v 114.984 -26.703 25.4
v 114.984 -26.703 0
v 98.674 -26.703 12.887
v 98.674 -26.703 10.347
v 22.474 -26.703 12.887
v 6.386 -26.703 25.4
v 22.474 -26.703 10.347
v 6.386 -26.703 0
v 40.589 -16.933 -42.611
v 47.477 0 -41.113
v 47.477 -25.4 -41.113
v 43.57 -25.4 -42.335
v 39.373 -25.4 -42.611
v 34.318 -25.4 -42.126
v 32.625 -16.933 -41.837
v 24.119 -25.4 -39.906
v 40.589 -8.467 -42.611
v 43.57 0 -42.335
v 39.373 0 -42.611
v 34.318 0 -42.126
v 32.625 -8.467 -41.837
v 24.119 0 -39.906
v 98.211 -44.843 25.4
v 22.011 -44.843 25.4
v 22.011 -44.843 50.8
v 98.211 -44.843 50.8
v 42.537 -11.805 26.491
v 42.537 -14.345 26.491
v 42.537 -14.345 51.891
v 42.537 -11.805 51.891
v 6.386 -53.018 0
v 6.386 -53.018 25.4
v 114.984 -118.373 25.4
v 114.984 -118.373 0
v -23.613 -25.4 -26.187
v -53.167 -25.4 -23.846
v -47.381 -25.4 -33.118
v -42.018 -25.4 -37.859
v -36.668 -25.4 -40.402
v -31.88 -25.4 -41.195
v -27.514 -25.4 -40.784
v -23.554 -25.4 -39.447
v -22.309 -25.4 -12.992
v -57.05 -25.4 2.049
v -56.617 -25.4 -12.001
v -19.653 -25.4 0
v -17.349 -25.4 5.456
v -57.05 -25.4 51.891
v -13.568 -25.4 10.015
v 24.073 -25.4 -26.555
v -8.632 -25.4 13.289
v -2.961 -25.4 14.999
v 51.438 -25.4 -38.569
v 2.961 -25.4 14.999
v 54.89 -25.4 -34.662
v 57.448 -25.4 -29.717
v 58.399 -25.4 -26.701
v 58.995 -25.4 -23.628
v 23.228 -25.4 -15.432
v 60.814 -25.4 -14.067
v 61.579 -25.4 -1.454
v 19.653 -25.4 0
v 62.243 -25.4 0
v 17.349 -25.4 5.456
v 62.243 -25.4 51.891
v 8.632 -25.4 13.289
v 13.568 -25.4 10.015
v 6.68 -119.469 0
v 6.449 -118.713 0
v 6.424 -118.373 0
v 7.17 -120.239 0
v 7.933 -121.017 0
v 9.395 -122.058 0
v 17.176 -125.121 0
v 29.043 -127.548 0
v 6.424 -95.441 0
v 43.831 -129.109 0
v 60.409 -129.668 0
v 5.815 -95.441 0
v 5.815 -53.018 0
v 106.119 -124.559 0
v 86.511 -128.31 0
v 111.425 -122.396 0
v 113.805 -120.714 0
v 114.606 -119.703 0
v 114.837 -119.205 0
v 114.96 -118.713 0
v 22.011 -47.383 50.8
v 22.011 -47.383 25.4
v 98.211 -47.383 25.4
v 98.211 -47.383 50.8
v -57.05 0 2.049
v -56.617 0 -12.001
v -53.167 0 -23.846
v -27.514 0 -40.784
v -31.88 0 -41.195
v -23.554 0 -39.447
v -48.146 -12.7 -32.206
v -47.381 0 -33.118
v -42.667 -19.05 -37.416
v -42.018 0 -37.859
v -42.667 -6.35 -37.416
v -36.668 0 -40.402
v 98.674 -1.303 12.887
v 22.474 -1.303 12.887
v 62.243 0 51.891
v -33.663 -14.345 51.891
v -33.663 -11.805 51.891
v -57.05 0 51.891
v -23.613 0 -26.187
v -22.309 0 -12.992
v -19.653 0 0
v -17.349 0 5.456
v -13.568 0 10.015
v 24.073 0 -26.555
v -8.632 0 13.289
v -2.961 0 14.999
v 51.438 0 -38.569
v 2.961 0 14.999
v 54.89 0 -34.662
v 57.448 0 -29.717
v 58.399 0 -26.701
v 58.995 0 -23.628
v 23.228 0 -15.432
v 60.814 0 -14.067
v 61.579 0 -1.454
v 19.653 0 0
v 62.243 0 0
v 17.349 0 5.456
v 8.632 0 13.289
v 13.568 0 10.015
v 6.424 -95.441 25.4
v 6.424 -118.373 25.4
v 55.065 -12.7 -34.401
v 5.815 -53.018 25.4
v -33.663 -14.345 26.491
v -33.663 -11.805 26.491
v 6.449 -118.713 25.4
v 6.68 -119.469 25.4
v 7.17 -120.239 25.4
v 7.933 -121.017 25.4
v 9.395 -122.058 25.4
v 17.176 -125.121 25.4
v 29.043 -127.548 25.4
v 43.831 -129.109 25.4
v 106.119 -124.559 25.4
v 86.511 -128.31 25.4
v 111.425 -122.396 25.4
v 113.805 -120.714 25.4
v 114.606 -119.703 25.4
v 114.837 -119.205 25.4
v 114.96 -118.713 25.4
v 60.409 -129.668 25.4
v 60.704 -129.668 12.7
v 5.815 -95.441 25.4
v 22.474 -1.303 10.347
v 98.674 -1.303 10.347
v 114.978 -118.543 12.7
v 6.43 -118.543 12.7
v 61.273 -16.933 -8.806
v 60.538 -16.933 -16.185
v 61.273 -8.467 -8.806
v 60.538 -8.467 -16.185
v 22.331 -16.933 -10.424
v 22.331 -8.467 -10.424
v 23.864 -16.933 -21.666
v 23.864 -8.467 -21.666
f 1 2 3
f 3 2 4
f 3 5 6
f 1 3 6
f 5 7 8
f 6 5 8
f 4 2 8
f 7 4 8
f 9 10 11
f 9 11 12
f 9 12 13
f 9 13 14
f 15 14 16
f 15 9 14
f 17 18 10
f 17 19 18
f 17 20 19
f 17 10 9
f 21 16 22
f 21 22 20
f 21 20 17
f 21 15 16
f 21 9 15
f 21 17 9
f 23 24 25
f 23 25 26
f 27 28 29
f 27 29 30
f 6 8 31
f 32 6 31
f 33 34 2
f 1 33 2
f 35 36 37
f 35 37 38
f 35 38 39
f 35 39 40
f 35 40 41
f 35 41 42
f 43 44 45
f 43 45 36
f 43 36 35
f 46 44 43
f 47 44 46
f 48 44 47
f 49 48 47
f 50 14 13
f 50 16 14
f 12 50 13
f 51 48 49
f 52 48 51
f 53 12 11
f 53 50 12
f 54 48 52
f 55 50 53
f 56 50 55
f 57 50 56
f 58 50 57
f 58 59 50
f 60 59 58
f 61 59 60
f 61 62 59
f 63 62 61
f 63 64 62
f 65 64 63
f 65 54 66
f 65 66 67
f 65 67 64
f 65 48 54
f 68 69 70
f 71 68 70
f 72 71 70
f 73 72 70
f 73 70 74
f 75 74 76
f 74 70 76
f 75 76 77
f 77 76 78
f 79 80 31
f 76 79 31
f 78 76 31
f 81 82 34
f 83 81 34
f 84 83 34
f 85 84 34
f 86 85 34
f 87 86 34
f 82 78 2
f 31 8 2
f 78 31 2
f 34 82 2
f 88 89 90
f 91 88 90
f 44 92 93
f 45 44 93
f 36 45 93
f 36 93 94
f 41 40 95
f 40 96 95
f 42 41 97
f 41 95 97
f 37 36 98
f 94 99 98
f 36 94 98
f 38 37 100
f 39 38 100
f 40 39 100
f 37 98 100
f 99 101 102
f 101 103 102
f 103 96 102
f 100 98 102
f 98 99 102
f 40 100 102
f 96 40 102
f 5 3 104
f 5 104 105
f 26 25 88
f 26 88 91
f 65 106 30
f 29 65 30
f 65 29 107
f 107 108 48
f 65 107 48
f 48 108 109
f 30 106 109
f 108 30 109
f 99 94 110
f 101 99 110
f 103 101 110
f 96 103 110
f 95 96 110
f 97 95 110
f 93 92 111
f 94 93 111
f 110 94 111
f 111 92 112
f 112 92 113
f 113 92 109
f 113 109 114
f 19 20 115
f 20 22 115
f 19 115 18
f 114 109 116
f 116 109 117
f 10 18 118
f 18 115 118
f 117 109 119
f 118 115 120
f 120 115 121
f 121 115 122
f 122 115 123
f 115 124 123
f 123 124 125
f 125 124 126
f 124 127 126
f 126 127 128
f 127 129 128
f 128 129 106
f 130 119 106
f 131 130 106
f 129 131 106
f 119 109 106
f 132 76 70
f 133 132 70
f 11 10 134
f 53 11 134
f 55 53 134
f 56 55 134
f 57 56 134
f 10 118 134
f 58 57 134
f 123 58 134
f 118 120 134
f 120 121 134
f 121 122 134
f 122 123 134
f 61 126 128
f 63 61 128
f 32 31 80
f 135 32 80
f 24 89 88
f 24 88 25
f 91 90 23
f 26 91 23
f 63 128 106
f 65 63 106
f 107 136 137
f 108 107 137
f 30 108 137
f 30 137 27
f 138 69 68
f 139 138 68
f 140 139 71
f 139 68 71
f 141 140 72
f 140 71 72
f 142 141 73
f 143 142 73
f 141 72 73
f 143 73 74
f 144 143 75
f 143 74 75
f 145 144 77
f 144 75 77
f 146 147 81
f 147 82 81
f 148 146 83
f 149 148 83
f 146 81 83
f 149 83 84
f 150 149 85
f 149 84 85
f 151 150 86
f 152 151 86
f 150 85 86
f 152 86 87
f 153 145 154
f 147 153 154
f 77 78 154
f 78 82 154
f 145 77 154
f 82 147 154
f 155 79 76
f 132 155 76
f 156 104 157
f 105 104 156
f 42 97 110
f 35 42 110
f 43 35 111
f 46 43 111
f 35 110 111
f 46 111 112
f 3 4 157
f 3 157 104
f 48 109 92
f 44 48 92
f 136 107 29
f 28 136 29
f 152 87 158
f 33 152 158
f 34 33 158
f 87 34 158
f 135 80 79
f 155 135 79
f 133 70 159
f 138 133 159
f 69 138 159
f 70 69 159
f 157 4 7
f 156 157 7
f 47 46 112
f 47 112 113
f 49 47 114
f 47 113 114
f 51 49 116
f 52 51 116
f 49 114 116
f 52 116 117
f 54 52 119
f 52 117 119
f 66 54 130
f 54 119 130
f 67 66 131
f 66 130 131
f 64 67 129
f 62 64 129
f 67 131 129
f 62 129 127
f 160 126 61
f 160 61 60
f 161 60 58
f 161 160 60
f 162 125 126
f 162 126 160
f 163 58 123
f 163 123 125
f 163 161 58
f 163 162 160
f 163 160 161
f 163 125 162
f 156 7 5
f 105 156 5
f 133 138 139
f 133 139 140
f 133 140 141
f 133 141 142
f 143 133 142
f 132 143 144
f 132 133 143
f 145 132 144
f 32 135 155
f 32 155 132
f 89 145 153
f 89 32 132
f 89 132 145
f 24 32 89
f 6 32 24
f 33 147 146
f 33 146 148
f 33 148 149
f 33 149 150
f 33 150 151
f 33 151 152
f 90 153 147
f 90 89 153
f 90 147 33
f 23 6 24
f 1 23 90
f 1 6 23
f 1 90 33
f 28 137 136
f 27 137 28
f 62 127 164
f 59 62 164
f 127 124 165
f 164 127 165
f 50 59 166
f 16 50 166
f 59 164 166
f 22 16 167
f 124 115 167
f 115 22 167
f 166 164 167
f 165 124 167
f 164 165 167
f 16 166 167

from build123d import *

# Parameters (mm, degrees)
F1_DEPTH = 25.4
F2_W     = 76.2
F2_H     = 2.54
F3_DEPTH = 25.4
F5_DEPTH = 25.4
F6_W     = 76.2
F6_H     = 2.54
F7_DEPTH = 25.4
F8_W     = 76.2
F8_H     = 2.54
F9_DEPTH = 25.4


with BuildPart() as f1:
    # F0 (on Front) → F1 (new body)
    with BuildSketch(Plane.XZ):
        with BuildLine():
            Line((62.2428618371, 51.8912672997), (-57.0498779416, 51.8912672997))
            Line((-57.0498779416, 51.8912672997), (-57.0498779416, 2.0486290034))
            add(Edge.make_bspline(
                [(-57.0498779416, 2.0486290034), (-62.8725917554, -57.5601651506), (-23.5538572735, -39.4474879084)],
                knots=[1.4290915848, 1.4290915848, 1.4290915848, 3.4471381657, 3.4471381657, 3.4471381657], degree=2, weights=[1, 0.5326875763, 1]))
            ThreePointArc((-23.5538572735, -39.4474879084), (-23.1311062984, -19.5726887681), (-19.6531451654, 0))
            ThreePointArc((-19.6531451654, 0), (0, 15.2158019665), (19.6531451654, 0))
            add(Edge.make_bspline(
                [(19.6531451654, 0), (20.6238584336, -3.4875863708), (22.5912929652, -10.5562008448), (24.2387527598, -21.9019388925), (24.1620099315, -33.4497913044), (24.11910519, -39.9058684707)],
                knots=[0, 0, 0, 0, 0.3004169931, 0.608882958, 1, 1, 1, 1], degree=3))
            add(Edge.make_bspline(
                [(47.476719356, -41.1129942258), (41.3063324166, -44.1182628579), (32.717853118, -42.0442846037), (24.11910519, -39.9058684707)],
                knots=[0.6578997811, 0.6578997811, 0.6578997811, 0.6578997811, 1, 1, 1, 1], degree=3))
            add(Edge.make_bspline(
                [(58.9949473098, -23.6284681863), (56.9882398729, -30.879237475), (53.3148096325, -38.2695696963), (47.476719356, -41.1129942258)],
                knots=[0.3342228414, 0.3342228414, 0.3342228414, 0.3342228414, 0.6578997811, 0.6578997811, 0.6578997811, 0.6578997811], degree=3))
            add(Edge.make_bspline(
                [(61.5792318695, -1.454491908), (61.36202452, -8.8032522142), (61.0670364179, -16.1414574779), (58.9949473098, -23.6284681863)],
                knots=[0, 0, 0, 0, 0.3342228414, 0.3342228414, 0.3342228414, 0.3342228414], degree=3))
            Line((61.5792318695, -1.454491908), (62.2428618371, 0))
            Line((62.2428618371, 0), (62.2428618371, 51.8912672997))
        make_face()
        with BuildLine():
            add(Edge.make_bspline(
                [(47.476719356, -41.1129942258), (57.185089489, -36.7539276341), (58.9949473098, -23.6284681863)],
                knots=[0.3330351725, 0.3330351725, 0.3330351725, 1.3936926102, 1.3936926102, 1.3936926102], degree=2, weights=[1, 0.8626408456, 1]))
            add(Edge.make_bspline(
                [(58.9949473098, -23.6284681863), (56.9882398729, -30.879237475), (53.3148096325, -38.2695696963), (47.476719356, -41.1129942258)],
                knots=[0.3342228414, 0.3342228414, 0.3342228414, 0.3342228414, 0.6578997811, 0.6578997811, 0.6578997811, 0.6578997811], degree=3))
        make_face()
    extrude(amount=F1_DEPTH)

    # F2 (on face) → F3 (cut)
    with BuildSketch(Plane.XY.offset(51.8912672997)):
        with Locations((4.4371271506, -13.0748547494)):
            Rectangle(F2_W, F2_H)
    extrude(amount=-F3_DEPTH, mode=Mode.SUBTRACT)


with BuildPart() as f5:
    # F4 (on Top) → F5 (new body)
    with BuildSketch(Plane.XY):
        with BuildLine():
            Line((6.4240375055, -95.4406112065), (6.4240375055, -118.3726499874))
            add(Edge.make_bspline(
                [(6.4240375055, -118.3726499874), (6.4240375055, -118.5430909379), (6.4487490888, -118.7134542936)],
                knots=[3.1415926536, 3.1415926536, 3.1415926536, 3.1717686083, 3.1717686083, 3.1717686083], degree=2, weights=[1, 0.9998861786, 1]))
            add(Edge.make_bspline(
                [(6.4487490888, -118.7134542936), (8.0377690426, -129.6682672247), (60.7042431856, -129.6682672247), (113.3707173286, -129.6682672247), (114.9597372824, -118.7134542936)],
                knots=[3.1717686083, 3.1717686083, 3.1717686083, 4.7123889804, 4.7123889804, 6.2530093525, 6.2530093525, 6.2530093525], degree=2, weights=[1, 0.7176947036, 1, 0.7176947036, 1]))
            add(Edge.make_bspline(
                [(114.9597372824, -118.7134542936), (114.9844488657, -118.5430909379), (114.9844488657, -118.3726499874)],
                knots=[6.2530093525, 6.2530093525, 6.2530093525, 6.2831853072, 6.2831853072, 6.2831853072], degree=2, weights=[1, 0.9998861786, 1]))
            Line((114.9844488657, -118.3726499874), (114.9844488657, -95.4406112065))
            Line((114.9844488657, -95.4406112065), (114.9844488657, -53.0177001276))
            Line((114.9844488657, -53.0177001276), (114.9844488657, -26.7026225953))
            Line((114.9844488657, -26.7026225953), (6.38557814, -26.7026225953))
            Line((6.38557814, -26.7026225953), (6.38557814, -53.0177001276))
            Line((6.38557814, -53.0177001276), (5.8152723915, -53.0177001276))
            Line((5.8152723915, -53.0177001276), (5.8152723915, -95.4406112065))
            Line((5.8152723915, -95.4406112065), (6.4240375055, -95.4406112065))
        make_face()
    extrude(amount=F5_DEPTH)

    # F6 (on face) → F7 (join)
    with BuildSketch(Plane.XY.offset(25.4)):
        with Locations((60.1108064875, -46.1128767049)):
            Rectangle(F6_W, F6_H)
    extrude(amount=F7_DEPTH)

    # F8 (on face) → F9 (join)
    with BuildSketch(Plane(origin=(0, -26.7026225953, 0), x_dir=(-1, 0, 0), z_dir=(0, 1, 0))):
        with Locations((-60.5735373735, 11.6173765776)):
            Rectangle(F8_W, F8_H)
    extrude(amount=F9_DEPTH)


solid = Compound([f1.part, f5.part])
